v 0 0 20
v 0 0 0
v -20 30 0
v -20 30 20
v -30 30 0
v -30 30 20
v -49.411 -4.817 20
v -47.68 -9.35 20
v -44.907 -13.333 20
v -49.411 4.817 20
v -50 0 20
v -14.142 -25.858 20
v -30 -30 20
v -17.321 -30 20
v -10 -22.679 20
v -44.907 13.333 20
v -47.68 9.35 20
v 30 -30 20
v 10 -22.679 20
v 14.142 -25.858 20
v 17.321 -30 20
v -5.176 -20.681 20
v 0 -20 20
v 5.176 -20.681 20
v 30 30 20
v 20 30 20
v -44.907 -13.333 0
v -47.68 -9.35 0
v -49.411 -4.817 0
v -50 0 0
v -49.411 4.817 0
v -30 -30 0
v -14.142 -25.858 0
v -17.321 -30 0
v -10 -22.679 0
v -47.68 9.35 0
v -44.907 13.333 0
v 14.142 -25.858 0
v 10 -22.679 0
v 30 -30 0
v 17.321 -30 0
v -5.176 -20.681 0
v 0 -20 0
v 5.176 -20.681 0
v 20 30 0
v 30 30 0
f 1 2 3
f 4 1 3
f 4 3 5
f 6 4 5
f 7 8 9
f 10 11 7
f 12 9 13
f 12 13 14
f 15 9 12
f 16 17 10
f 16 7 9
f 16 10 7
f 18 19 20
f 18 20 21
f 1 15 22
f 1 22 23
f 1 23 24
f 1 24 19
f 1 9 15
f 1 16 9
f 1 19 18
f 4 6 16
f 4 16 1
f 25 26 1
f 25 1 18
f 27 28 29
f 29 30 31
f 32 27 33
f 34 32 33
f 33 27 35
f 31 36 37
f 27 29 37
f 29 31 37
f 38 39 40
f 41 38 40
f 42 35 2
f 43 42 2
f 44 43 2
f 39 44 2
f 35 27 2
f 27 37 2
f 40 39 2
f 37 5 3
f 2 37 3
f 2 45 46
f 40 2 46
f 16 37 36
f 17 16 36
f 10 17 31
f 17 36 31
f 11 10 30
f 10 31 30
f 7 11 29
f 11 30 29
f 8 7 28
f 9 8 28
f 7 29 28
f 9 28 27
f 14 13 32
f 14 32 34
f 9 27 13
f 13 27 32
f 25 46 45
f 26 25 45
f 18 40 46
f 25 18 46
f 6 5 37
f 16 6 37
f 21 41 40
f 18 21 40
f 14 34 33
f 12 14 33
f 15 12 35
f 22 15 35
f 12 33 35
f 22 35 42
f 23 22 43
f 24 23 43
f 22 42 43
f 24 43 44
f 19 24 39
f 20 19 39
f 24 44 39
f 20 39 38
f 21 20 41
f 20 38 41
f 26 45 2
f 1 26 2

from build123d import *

# Parameters (mm, degrees)
F1_DEPTH = 20


with BuildPart() as f1:
    # F0 (on Top) → F1 (new body)
    with BuildSketch(Plane.XY):
        with BuildLine():
            ThreePointArc((-17.320508, -30), (0, -20), (17.320508, -30))
            Line((17.320508, -30), (30, -30))
            Line((30, -30), (30, 30))
            Line((30, 30), (20, 30))
            Line((20, 30), (0, 0))
            Line((0, 0), (-20, 30))
            Line((-20, 30), (-30, 30))
            Line((-30, 30), (-44.90712, 13.333333))
            ThreePointArc((-44.90712, 13.333333), (-50, 0), (-44.90712, -13.333333))
            Line((-44.90712, -13.333333), (-30, -30))
            Line((-30, -30), (-17.320508, -30))
        make_face()
    extrude(amount=F1_DEPTH)


solid = f1.part
